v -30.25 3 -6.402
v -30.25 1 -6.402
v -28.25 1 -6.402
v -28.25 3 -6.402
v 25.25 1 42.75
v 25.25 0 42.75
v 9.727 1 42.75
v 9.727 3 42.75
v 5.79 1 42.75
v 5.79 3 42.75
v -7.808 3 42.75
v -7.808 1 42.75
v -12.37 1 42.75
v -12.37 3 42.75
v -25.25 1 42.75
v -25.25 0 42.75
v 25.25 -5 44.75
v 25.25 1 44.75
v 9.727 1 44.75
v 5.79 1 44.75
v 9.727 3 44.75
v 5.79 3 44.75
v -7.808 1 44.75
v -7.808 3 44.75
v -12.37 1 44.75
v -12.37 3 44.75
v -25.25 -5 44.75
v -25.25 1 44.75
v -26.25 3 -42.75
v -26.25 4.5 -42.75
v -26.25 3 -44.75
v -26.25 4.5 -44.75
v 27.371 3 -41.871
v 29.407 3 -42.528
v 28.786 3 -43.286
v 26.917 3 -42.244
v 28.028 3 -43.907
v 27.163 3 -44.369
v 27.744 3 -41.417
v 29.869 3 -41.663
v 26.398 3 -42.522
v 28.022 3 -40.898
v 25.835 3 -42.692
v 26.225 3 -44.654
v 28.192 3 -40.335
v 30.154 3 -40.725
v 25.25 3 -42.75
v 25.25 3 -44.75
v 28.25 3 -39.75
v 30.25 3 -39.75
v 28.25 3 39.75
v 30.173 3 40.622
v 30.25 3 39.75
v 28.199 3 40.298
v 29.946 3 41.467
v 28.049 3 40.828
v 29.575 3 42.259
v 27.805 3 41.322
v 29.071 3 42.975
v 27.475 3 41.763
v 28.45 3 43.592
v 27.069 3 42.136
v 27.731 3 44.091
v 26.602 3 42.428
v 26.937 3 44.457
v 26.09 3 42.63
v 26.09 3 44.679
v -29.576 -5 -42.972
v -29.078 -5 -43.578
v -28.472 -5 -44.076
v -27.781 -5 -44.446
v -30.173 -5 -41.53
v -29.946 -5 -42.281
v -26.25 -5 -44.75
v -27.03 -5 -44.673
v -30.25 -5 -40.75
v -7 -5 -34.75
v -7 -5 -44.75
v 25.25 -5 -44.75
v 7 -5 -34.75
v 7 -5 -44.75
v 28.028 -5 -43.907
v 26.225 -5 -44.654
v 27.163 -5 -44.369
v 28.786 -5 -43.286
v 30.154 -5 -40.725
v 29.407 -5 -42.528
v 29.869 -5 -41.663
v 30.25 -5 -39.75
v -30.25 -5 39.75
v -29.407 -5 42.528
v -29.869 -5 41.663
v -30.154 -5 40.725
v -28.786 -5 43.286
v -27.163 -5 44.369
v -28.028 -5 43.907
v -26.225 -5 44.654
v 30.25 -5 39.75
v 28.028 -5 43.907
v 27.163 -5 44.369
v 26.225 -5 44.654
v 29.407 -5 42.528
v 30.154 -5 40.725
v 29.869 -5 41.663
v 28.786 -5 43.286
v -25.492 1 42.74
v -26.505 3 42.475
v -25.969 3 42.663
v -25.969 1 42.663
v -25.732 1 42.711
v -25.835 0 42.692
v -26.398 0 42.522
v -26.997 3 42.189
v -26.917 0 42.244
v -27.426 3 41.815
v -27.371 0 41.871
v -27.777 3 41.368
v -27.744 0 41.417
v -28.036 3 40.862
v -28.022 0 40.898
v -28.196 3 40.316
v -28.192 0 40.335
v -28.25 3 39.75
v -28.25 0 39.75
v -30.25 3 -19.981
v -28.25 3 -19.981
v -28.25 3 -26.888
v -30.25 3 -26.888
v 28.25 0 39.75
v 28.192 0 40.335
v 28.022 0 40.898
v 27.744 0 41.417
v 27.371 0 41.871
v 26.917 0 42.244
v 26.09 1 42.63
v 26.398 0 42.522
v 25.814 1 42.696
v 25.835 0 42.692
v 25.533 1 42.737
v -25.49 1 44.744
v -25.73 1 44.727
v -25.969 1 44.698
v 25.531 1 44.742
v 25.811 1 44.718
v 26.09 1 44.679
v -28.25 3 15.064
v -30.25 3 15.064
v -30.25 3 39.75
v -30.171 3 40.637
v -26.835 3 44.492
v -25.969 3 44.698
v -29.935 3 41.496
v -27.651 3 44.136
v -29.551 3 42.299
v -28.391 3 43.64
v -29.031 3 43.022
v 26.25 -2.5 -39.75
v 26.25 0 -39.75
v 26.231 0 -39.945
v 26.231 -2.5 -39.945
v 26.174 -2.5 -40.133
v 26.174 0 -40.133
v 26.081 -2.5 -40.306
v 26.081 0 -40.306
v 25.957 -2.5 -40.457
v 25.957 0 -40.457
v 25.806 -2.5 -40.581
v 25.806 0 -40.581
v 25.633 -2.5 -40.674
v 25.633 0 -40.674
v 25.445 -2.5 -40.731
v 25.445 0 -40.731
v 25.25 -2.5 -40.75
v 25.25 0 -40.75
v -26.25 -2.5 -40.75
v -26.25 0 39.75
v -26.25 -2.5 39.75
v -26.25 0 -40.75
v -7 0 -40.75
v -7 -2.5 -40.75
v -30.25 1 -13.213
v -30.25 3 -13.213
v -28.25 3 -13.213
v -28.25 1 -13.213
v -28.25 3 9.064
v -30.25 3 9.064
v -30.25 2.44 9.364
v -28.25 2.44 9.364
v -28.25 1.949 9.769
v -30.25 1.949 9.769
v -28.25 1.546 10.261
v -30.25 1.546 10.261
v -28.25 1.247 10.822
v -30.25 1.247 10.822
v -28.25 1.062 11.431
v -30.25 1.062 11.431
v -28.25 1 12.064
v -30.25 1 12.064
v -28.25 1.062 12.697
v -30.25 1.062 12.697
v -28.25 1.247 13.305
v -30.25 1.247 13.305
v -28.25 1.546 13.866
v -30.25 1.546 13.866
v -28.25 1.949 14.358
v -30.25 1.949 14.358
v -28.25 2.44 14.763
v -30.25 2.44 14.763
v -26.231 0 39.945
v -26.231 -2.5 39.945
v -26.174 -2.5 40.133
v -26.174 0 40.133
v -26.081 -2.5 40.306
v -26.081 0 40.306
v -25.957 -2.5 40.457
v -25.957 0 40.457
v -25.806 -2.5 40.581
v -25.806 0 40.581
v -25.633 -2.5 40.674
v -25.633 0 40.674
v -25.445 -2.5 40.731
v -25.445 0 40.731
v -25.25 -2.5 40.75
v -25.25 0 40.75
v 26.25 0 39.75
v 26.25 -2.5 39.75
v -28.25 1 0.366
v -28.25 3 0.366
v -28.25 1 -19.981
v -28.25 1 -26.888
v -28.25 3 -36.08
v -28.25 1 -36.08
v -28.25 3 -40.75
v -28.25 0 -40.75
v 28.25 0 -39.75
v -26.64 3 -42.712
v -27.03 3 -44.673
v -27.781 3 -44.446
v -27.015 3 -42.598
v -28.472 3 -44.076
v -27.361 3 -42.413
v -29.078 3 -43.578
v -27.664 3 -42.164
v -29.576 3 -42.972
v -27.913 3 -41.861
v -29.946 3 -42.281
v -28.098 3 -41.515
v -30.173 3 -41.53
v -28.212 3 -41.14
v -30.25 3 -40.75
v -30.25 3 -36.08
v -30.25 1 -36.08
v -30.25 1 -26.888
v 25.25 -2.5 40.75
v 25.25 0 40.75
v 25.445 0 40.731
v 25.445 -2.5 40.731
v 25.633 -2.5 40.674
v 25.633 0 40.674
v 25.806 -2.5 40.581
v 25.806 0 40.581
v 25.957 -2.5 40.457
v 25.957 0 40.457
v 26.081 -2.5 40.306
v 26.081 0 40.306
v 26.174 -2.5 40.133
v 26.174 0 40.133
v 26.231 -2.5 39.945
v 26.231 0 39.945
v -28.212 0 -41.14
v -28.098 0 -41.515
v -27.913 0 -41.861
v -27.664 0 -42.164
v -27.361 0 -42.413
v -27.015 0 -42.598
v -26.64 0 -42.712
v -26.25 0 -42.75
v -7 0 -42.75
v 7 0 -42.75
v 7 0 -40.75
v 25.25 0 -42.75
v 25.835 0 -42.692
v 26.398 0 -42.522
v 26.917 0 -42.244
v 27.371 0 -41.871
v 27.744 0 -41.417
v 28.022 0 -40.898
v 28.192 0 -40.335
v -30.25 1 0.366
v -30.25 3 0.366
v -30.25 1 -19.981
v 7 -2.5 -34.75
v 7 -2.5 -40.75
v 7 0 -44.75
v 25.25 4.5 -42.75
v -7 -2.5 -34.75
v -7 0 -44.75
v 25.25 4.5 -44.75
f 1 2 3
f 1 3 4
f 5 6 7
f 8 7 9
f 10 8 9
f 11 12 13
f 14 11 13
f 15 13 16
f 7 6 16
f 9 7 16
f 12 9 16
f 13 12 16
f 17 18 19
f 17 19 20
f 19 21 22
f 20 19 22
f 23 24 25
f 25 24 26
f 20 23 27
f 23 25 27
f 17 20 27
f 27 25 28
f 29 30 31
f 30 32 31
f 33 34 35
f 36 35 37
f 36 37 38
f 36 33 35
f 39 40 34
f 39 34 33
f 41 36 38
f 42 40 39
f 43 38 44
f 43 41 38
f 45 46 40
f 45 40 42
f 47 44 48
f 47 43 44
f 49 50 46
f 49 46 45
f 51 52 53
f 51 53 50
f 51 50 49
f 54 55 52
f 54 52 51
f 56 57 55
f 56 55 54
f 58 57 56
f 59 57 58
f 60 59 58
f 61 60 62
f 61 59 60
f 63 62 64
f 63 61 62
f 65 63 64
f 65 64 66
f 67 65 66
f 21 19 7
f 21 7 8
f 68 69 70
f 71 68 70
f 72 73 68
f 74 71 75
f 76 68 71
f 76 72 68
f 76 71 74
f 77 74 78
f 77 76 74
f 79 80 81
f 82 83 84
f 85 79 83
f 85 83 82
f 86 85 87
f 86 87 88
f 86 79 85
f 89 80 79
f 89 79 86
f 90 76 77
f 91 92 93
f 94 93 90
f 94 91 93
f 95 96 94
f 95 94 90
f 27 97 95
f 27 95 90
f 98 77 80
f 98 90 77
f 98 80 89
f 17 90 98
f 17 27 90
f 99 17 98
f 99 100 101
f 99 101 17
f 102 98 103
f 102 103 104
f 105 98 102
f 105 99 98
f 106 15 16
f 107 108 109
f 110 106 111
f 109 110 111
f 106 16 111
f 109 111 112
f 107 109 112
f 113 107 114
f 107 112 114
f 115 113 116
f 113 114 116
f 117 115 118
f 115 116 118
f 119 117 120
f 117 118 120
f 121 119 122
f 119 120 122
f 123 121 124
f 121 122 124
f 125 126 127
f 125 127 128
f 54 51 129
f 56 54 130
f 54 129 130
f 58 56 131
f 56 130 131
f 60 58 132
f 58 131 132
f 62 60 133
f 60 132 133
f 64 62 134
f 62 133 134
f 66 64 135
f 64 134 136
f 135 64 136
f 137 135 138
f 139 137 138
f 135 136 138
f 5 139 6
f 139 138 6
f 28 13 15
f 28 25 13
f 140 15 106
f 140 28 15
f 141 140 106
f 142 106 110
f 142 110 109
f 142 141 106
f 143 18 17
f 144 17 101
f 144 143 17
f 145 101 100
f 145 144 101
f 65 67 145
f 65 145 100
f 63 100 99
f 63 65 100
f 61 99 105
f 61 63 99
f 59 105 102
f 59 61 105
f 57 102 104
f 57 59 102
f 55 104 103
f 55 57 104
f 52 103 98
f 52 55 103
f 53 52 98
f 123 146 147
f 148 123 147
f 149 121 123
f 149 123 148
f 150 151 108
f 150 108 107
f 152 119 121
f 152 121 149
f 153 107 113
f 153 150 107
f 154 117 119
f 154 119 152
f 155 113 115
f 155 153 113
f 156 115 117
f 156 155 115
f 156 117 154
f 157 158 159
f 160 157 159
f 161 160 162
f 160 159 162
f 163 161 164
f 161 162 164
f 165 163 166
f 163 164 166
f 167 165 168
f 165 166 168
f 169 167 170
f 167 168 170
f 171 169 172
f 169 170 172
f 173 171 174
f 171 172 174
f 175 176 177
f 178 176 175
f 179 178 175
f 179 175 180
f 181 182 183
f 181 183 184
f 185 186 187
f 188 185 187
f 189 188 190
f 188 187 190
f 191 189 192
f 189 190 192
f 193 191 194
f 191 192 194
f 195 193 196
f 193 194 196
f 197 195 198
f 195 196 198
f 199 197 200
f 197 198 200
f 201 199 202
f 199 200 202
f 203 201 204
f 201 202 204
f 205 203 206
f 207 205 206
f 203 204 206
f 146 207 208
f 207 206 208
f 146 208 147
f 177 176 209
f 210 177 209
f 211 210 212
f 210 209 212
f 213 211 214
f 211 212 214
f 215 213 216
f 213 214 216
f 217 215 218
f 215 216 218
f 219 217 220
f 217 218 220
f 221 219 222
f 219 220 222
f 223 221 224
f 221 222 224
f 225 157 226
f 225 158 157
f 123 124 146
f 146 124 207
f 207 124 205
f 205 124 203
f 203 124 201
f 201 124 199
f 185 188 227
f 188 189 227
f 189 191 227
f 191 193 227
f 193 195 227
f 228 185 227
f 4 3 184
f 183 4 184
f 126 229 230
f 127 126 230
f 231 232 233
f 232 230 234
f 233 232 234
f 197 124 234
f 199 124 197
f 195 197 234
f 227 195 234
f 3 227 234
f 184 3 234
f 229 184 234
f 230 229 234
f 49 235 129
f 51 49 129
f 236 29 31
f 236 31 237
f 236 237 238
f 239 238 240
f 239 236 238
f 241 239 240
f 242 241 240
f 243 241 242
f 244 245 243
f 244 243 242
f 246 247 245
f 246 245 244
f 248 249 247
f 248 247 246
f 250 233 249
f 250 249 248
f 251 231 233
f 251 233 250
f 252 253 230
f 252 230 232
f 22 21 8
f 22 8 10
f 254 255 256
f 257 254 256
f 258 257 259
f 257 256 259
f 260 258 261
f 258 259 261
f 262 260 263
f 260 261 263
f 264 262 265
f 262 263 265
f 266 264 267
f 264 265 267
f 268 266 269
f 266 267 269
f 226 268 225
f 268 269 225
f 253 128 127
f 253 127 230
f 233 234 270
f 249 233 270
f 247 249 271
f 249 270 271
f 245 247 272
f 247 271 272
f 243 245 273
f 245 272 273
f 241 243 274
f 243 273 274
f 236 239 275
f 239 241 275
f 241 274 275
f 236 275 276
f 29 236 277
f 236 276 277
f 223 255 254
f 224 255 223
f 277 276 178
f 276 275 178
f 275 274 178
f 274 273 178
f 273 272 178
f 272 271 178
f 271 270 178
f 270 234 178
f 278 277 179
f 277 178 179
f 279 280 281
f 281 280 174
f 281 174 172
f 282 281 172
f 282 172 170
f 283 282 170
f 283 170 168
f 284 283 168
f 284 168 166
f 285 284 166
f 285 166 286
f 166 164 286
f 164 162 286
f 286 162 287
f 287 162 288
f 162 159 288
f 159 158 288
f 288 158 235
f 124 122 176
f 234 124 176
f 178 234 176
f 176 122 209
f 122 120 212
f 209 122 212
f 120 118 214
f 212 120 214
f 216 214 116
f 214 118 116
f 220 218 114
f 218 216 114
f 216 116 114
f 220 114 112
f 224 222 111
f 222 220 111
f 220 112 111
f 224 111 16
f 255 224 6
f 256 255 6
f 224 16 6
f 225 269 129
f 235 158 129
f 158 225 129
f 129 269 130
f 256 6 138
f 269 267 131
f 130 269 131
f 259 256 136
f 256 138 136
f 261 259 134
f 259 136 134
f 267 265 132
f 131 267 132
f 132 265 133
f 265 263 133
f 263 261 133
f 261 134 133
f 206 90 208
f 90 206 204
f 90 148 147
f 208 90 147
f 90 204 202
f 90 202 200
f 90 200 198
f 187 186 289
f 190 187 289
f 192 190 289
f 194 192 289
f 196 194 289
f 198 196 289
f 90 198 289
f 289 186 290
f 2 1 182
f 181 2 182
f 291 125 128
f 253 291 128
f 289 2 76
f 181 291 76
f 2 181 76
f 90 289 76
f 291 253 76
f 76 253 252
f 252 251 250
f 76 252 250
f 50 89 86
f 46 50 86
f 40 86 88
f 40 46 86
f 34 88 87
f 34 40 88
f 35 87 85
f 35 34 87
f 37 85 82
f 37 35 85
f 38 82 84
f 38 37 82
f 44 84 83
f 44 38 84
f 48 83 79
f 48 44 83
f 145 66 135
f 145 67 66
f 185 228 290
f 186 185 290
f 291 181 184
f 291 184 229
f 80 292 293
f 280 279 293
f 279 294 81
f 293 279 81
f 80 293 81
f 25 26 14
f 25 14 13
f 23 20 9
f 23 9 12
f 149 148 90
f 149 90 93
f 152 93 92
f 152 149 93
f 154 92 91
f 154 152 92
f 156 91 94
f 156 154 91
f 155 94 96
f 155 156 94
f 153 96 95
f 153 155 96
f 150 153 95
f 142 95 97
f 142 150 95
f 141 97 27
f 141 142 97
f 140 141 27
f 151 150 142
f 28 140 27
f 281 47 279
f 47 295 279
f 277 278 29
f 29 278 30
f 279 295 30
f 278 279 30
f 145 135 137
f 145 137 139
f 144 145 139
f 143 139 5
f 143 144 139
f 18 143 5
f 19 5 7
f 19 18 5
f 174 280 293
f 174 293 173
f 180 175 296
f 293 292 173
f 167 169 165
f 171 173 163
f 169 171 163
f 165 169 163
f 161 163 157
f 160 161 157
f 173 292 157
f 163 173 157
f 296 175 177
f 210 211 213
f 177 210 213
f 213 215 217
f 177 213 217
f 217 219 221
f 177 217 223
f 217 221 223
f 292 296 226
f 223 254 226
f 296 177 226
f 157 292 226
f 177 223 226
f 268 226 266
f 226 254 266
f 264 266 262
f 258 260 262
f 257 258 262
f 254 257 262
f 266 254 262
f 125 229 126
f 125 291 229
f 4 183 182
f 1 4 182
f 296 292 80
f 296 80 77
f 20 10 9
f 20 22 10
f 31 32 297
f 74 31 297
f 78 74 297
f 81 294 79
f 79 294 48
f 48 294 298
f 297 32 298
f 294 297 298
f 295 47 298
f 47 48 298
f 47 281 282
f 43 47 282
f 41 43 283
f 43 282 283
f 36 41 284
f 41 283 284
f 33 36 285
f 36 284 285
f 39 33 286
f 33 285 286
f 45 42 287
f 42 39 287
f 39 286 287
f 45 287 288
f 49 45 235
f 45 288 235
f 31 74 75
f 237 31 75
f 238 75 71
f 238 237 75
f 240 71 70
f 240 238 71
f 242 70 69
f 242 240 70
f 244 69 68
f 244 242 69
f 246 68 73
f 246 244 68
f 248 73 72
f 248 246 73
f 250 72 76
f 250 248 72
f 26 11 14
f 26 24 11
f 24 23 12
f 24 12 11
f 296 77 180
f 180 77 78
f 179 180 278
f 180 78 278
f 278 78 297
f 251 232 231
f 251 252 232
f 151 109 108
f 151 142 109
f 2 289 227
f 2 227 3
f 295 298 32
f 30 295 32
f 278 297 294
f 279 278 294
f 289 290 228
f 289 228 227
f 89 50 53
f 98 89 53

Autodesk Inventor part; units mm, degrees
ref_plane "YZ Plane" through (0, 0, 0) normal (1, 0, 0) x (0, 1, 0)
ref_plane "XZ Plane" through (0, 0, 0) normal (0, 1, 0) x (-1, 0, 0)
ref_plane "XY Plane" through (0, 0, 0) normal (0, 0, 1) x (1, 0, 0)
sketch "Sketch1" plane through (0, 0, 0) normal (0, 1, 0) x (-1, 0, 0)
  line L0 (-25.25, 42.75) -> (25.25, 42.75)
  line L1 (28.25, 39.75) -> (28.25, -40.75)
  line L2 (26.25, -42.75) -> (-25.25, -42.75)
  line L3 (-28.25, -39.75) -> (-28.25, 39.75)
  line L4 (-28.25, 42.75) -> (28.25, -42.75) construction
  line L5 (28.25, 42.75) -> (-28.25, -42.75) construction
  arc A0 (26.25, -42.75) -> (28.25, -40.75) centre (26.25, -40.75) ccw
  arc A1 (-28.25, -39.75) -> (-25.25, -42.75) centre (-25.25, -39.75) ccw
  arc A2 (-25.25, 42.75) -> (-28.25, 39.75) centre (-25.25, 39.75) ccw
  arc A3 (28.25, 39.75) -> (25.25, 42.75) centre (25.25, 39.75) ccw
  line L6 (30.25, -40.75) -> (30.25, 39.75)
  arc A4 (30.25, 39.75) -> (25.25, 44.75) centre (25.25, 39.75) ccw
  line L7 (25.25, 44.75) -> (-25.25, 44.75)
  arc A5 (-25.25, 44.75) -> (-30.25, 39.75) centre (-25.25, 39.75) ccw
  line L8 (-30.25, 39.75) -> (-30.25, -39.75)
  arc A6 (-30.25, -39.75) -> (-25.25, -44.75) centre (-25.25, -39.75) ccw
  line L9 (-25.25, -44.75) -> (26.25, -44.75)
  arc A7 (26.25, -44.75) -> (30.25, -40.75) centre (26.25, -40.75) ccw
  point P0 (0, 0)
  dimension "d0" = 56.5
  dimension "d1" = 85.5
  dimension "d2" = 2
  dimension "d3" = 3
  dimension "d4" = 2
extrude "Extrusion1" add sketch "Sketch1" along normal blind 3
sketch "Sketch2" plane through (0, 0, 0) normal (0, -1, 0) x (1, 0, 0)
  arc A0 (-25.25, 44.75) -> (-30.25, 39.75) centre (-25.25, 39.75) ccw projected
  line L0 (-25.25, 44.75) -> (25.25, 44.75) projected
  arc A1 (30.25, 39.75) -> (25.25, 44.75) centre (25.25, 39.75) ccw projected
  line L1 (30.25, 39.75) -> (30.25, -39.75) projected
  arc A2 (25.25, -44.75) -> (30.25, -39.75) centre (25.25, -39.75) ccw projected
  line L2 (25.25, -44.75) -> (-26.25, -44.75) projected
  arc A3 (-30.25, -40.75) -> (-26.25, -44.75) centre (-26.25, -40.75) ccw projected
  line L3 (-30.25, -40.75) -> (-30.25, 39.75) projected
  line L4 (-26.25, -44.75) -> (25.25, -44.75)
  line L5 (30.25, -39.75) -> (30.25, 39.75)
  line L6 (25.25, 44.75) -> (-25.25, 44.75)
  line L7 (-30.25, 39.75) -> (-30.25, -40.75)
  line L8 (-30, -44.5) -> (30, 44.5) construction
  line L9 (30, -44.5) -> (-30, 44.5) construction
  arc A4 (-25.25, 44.75) -> (-30.25, 39.75) centre (-25.25, 39.75) ccw
  arc A5 (30.25, 39.75) -> (25.25, 44.75) centre (25.25, 39.75) ccw
  arc A6 (25.25, -42.75) -> (28.25, -39.75) centre (25.25, -39.75) ccw projected
  arc A7 (25.25, -44.75) -> (30.25, -39.75) centre (25.25, -39.75) ccw
  arc A8 (-30.25, -40.75) -> (-26.25, -44.75) centre (-26.25, -40.75) ccw
  line L10 (25.25, 40.75) -> (-25.25, 40.75)
  arc A9 (-25.25, 40.75) -> (-26.25, 39.75) centre (-25.25, 39.75) ccw
  line L11 (-26.25, 39.75) -> (-26.25, -40.75)
  line L12 (-26.25, -40.75) -> (25.25, -40.75)
  arc A10 (25.25, -40.75) -> (26.25, -39.75) centre (25.25, -39.75) ccw
  line L13 (26.25, -39.75) -> (26.25, 39.75)
  arc A11 (26.25, 39.75) -> (25.25, 40.75) centre (25.25, 39.75) ccw
  point P0 (0, 0)
  point P1 (-26.25, -40.75)
  dimension "d12" = 4
extrude "Extrusion2" add sketch "Sketch2" along normal blind 2.5
sketch "Sketch3" plane through (25.25, 3, -44.75) normal (0, 0, -1) x (-1, 0, 0)
  line L0 (51.5, -5.5) -> (51.5, 0) projected
  line L1 (51.5, 0) -> (0, 0)
  line L2 (0, 0) -> (0, 1.5)
  line L3 (0, 1.5) -> (51.5, 1.5)
  line L4 (51.5, 1.5) -> (51.5, 0)
  point P0 (25.25, -3)
  dimension "d9" = 1.5
extrude "Extrusion3" add sketch "Sketch3" against normal blind 2
sketch "Sketch4" plane through (0, -2.5, 0) normal (0, -1, 0) x (1, 0, 0)
  line L0 (25.25, 44.75) -> (-25.25, 44.75)
  line L1 (-30.25, 39.75) -> (-30.25, -40.75)
  line L2 (-26.25, -44.75) -> (25.25, -44.75)
  line L3 (30.25, -39.75) -> (30.25, 39.75)
  line L4 (30, 44.5) -> (-30, -44.5) construction
  line L5 (-30, 44.5) -> (30, -44.5) construction
  line L6 (-26.25, -44.75) -> (25.25, -44.75) projected
  line L7 (-30.25, 39.75) -> (-30.25, -40.75) projected
  arc A0 (25.25, -44.75) -> (30.25, -39.75) centre (25.25, -39.75) ccw projected
  arc A1 (-30.25, -40.75) -> (-26.25, -44.75) centre (-26.25, -40.75) ccw projected
  arc A2 (-25.25, 44.75) -> (-30.25, 39.75) centre (-25.25, 39.75) ccw projected
  arc A3 (30.25, 39.75) -> (25.25, 44.75) centre (25.25, 39.75) ccw projected
  arc A4 (25.25, -44.75) -> (30.25, -39.75) centre (25.25, -39.75) ccw
  line L8 (25.25, -40.75) -> (-26.25, -40.75) projected
  arc A5 (-30.25, -40.75) -> (-26.25, -44.75) centre (-26.25, -40.75) ccw
  arc A6 (-25.25, 44.75) -> (-30.25, 39.75) centre (-25.25, 39.75) ccw
  arc A7 (30.25, 39.75) -> (25.25, 44.75) centre (25.25, 39.75) ccw
  line L9 (25.25, 44.75) -> (-25.25, 44.75) projected
  point P0 (0, 0)
  point P1 (-30.25, 39.75)
  point P2 (-30.25, -40.75)
  point P3 (25.25, -44.75)
extrude "Extrusion4" add sketch "Sketch4" along normal blind 2.5
sketch "Sketch5" plane through (25.25, 4.5, -44.75) normal (0, 0, -1) x (-1, 0, 0)
  line L0 (51.5, -9.5) -> (0, -9.5) projected
  line L1 (18.25, -9.5) -> (32.25, -9.5)
  line L2 (32.25, -9.5) -> (32.25, -4.5)
  line L3 (32.25, -4.5) -> (18.25, -4.5)
  line L4 (18.25, -4.5) -> (18.25, -9.5)
  line L5 (18.25, -9.5) -> (32.25, -4.5) construction
  line L6 (32.25, -9.5) -> (18.25, -4.5) construction
  point P0 (25.25, -4.5)
  point P1 (25.25, -7)
  dimension "d16" = 14
  dimension "d17" = 0
  dimension "d18" = 5
extrude "Extrusion5" cut sketch "Sketch5" against normal blind 10
sketch "Sketch6" plane through (-30.25, 3, -40.75) normal (-1, 0, 0) x (0, 0, 1)
  line L0 (1, 0) -> (80.5, 0) projected
  line L1 (4.6696, 0) -> (13.8622, 0)
  line L2 (13.8622, 0) -> (13.8622, -2)
  line L3 (13.8622, -2) -> (4.6696, -2)
  line L4 (4.6696, -2) -> (4.6696, 0)
  line L5 (20.7687, 0) -> (27.5371, 0)
  line L6 (27.5371, 0) -> (27.5371, -2)
  line L7 (27.5371, -2) -> (20.7687, -2)
  line L8 (20.7687, -2) -> (20.7687, 0)
  line L9 (34.3481, 0) -> (41.1165, 0)
  line L10 (41.1165, 0) -> (41.1165, -2)
  line L11 (41.1165, -2) -> (34.3481, -2)
  line L12 (34.3481, -2) -> (34.3481, 0)
  arc A0 (49.8136, 0) -> (55.8136, 0) centre (52.8136, 1.25) ccw
  line L13 (-2, 1.5) -> (-2, 0) projected
  line L14 (80.5, -8) -> (0, -8) projected
  line L15 (49.8136, 0) -> (55.8136, 0)
  point P0 (40.75, -3)
  dimension "d21" = 6.6696
  dimension "d22" = 9.1926
  dimension "d23" = 22.7687
  dimension "d25" = 6.7684
  dimension "d26" = 6.7684
  dimension "d27" = 36.3481
  dimension "d28" = 51.8136
  dimension "d29" = 6
  dimension "d30" = 2
extrude "Extrusion6" cut sketch "Sketch6" against normal up to surface (2 mm away)
sketch "Sketch7" plane through (-25.25, 3, 44.75) normal (0, 0, 1) x (1, 0, 0)
  line L0 (50.5, 0) -> (0, 0) projected
  line L1 (-0.7188, 0) -> (12.8798, 0)
  line L2 (12.8798, 0) -> (12.8798, -2)
  line L3 (12.8798, -2) -> (-0.7188, -2)
  line L4 (-0.7188, -2) -> (-0.7188, 0)
  line L5 (17.4418, 0) -> (31.0404, 0)
  line L6 (31.0404, 0) -> (31.0404, -2)
  line L7 (31.0404, -2) -> (17.4418, -2)
  line L8 (17.4418, -2) -> (17.4418, 0)
  line L9 (34.977, 0) -> (51.34, 0)
  line L10 (51.34, 0) -> (51.34, -2)
  line L11 (51.34, -2) -> (34.977, -2)
  line L12 (34.977, -2) -> (34.977, 0)
  line L13 (-3, -3) -> (-3, 0) projected
  point P0 (25.25, -3)
  dimension "d33" = 2
  dimension "d34" = 2.2812
  dimension "d35" = 13.5986
  dimension "d36" = 20.4418
  dimension "d37" = 13.5986
  dimension "d38" = 37.977
  dimension "d39" = 16.363
extrude "Extrusion7" cut sketch "Sketch7" against normal blind 5
properties part number "piholder-v2"
